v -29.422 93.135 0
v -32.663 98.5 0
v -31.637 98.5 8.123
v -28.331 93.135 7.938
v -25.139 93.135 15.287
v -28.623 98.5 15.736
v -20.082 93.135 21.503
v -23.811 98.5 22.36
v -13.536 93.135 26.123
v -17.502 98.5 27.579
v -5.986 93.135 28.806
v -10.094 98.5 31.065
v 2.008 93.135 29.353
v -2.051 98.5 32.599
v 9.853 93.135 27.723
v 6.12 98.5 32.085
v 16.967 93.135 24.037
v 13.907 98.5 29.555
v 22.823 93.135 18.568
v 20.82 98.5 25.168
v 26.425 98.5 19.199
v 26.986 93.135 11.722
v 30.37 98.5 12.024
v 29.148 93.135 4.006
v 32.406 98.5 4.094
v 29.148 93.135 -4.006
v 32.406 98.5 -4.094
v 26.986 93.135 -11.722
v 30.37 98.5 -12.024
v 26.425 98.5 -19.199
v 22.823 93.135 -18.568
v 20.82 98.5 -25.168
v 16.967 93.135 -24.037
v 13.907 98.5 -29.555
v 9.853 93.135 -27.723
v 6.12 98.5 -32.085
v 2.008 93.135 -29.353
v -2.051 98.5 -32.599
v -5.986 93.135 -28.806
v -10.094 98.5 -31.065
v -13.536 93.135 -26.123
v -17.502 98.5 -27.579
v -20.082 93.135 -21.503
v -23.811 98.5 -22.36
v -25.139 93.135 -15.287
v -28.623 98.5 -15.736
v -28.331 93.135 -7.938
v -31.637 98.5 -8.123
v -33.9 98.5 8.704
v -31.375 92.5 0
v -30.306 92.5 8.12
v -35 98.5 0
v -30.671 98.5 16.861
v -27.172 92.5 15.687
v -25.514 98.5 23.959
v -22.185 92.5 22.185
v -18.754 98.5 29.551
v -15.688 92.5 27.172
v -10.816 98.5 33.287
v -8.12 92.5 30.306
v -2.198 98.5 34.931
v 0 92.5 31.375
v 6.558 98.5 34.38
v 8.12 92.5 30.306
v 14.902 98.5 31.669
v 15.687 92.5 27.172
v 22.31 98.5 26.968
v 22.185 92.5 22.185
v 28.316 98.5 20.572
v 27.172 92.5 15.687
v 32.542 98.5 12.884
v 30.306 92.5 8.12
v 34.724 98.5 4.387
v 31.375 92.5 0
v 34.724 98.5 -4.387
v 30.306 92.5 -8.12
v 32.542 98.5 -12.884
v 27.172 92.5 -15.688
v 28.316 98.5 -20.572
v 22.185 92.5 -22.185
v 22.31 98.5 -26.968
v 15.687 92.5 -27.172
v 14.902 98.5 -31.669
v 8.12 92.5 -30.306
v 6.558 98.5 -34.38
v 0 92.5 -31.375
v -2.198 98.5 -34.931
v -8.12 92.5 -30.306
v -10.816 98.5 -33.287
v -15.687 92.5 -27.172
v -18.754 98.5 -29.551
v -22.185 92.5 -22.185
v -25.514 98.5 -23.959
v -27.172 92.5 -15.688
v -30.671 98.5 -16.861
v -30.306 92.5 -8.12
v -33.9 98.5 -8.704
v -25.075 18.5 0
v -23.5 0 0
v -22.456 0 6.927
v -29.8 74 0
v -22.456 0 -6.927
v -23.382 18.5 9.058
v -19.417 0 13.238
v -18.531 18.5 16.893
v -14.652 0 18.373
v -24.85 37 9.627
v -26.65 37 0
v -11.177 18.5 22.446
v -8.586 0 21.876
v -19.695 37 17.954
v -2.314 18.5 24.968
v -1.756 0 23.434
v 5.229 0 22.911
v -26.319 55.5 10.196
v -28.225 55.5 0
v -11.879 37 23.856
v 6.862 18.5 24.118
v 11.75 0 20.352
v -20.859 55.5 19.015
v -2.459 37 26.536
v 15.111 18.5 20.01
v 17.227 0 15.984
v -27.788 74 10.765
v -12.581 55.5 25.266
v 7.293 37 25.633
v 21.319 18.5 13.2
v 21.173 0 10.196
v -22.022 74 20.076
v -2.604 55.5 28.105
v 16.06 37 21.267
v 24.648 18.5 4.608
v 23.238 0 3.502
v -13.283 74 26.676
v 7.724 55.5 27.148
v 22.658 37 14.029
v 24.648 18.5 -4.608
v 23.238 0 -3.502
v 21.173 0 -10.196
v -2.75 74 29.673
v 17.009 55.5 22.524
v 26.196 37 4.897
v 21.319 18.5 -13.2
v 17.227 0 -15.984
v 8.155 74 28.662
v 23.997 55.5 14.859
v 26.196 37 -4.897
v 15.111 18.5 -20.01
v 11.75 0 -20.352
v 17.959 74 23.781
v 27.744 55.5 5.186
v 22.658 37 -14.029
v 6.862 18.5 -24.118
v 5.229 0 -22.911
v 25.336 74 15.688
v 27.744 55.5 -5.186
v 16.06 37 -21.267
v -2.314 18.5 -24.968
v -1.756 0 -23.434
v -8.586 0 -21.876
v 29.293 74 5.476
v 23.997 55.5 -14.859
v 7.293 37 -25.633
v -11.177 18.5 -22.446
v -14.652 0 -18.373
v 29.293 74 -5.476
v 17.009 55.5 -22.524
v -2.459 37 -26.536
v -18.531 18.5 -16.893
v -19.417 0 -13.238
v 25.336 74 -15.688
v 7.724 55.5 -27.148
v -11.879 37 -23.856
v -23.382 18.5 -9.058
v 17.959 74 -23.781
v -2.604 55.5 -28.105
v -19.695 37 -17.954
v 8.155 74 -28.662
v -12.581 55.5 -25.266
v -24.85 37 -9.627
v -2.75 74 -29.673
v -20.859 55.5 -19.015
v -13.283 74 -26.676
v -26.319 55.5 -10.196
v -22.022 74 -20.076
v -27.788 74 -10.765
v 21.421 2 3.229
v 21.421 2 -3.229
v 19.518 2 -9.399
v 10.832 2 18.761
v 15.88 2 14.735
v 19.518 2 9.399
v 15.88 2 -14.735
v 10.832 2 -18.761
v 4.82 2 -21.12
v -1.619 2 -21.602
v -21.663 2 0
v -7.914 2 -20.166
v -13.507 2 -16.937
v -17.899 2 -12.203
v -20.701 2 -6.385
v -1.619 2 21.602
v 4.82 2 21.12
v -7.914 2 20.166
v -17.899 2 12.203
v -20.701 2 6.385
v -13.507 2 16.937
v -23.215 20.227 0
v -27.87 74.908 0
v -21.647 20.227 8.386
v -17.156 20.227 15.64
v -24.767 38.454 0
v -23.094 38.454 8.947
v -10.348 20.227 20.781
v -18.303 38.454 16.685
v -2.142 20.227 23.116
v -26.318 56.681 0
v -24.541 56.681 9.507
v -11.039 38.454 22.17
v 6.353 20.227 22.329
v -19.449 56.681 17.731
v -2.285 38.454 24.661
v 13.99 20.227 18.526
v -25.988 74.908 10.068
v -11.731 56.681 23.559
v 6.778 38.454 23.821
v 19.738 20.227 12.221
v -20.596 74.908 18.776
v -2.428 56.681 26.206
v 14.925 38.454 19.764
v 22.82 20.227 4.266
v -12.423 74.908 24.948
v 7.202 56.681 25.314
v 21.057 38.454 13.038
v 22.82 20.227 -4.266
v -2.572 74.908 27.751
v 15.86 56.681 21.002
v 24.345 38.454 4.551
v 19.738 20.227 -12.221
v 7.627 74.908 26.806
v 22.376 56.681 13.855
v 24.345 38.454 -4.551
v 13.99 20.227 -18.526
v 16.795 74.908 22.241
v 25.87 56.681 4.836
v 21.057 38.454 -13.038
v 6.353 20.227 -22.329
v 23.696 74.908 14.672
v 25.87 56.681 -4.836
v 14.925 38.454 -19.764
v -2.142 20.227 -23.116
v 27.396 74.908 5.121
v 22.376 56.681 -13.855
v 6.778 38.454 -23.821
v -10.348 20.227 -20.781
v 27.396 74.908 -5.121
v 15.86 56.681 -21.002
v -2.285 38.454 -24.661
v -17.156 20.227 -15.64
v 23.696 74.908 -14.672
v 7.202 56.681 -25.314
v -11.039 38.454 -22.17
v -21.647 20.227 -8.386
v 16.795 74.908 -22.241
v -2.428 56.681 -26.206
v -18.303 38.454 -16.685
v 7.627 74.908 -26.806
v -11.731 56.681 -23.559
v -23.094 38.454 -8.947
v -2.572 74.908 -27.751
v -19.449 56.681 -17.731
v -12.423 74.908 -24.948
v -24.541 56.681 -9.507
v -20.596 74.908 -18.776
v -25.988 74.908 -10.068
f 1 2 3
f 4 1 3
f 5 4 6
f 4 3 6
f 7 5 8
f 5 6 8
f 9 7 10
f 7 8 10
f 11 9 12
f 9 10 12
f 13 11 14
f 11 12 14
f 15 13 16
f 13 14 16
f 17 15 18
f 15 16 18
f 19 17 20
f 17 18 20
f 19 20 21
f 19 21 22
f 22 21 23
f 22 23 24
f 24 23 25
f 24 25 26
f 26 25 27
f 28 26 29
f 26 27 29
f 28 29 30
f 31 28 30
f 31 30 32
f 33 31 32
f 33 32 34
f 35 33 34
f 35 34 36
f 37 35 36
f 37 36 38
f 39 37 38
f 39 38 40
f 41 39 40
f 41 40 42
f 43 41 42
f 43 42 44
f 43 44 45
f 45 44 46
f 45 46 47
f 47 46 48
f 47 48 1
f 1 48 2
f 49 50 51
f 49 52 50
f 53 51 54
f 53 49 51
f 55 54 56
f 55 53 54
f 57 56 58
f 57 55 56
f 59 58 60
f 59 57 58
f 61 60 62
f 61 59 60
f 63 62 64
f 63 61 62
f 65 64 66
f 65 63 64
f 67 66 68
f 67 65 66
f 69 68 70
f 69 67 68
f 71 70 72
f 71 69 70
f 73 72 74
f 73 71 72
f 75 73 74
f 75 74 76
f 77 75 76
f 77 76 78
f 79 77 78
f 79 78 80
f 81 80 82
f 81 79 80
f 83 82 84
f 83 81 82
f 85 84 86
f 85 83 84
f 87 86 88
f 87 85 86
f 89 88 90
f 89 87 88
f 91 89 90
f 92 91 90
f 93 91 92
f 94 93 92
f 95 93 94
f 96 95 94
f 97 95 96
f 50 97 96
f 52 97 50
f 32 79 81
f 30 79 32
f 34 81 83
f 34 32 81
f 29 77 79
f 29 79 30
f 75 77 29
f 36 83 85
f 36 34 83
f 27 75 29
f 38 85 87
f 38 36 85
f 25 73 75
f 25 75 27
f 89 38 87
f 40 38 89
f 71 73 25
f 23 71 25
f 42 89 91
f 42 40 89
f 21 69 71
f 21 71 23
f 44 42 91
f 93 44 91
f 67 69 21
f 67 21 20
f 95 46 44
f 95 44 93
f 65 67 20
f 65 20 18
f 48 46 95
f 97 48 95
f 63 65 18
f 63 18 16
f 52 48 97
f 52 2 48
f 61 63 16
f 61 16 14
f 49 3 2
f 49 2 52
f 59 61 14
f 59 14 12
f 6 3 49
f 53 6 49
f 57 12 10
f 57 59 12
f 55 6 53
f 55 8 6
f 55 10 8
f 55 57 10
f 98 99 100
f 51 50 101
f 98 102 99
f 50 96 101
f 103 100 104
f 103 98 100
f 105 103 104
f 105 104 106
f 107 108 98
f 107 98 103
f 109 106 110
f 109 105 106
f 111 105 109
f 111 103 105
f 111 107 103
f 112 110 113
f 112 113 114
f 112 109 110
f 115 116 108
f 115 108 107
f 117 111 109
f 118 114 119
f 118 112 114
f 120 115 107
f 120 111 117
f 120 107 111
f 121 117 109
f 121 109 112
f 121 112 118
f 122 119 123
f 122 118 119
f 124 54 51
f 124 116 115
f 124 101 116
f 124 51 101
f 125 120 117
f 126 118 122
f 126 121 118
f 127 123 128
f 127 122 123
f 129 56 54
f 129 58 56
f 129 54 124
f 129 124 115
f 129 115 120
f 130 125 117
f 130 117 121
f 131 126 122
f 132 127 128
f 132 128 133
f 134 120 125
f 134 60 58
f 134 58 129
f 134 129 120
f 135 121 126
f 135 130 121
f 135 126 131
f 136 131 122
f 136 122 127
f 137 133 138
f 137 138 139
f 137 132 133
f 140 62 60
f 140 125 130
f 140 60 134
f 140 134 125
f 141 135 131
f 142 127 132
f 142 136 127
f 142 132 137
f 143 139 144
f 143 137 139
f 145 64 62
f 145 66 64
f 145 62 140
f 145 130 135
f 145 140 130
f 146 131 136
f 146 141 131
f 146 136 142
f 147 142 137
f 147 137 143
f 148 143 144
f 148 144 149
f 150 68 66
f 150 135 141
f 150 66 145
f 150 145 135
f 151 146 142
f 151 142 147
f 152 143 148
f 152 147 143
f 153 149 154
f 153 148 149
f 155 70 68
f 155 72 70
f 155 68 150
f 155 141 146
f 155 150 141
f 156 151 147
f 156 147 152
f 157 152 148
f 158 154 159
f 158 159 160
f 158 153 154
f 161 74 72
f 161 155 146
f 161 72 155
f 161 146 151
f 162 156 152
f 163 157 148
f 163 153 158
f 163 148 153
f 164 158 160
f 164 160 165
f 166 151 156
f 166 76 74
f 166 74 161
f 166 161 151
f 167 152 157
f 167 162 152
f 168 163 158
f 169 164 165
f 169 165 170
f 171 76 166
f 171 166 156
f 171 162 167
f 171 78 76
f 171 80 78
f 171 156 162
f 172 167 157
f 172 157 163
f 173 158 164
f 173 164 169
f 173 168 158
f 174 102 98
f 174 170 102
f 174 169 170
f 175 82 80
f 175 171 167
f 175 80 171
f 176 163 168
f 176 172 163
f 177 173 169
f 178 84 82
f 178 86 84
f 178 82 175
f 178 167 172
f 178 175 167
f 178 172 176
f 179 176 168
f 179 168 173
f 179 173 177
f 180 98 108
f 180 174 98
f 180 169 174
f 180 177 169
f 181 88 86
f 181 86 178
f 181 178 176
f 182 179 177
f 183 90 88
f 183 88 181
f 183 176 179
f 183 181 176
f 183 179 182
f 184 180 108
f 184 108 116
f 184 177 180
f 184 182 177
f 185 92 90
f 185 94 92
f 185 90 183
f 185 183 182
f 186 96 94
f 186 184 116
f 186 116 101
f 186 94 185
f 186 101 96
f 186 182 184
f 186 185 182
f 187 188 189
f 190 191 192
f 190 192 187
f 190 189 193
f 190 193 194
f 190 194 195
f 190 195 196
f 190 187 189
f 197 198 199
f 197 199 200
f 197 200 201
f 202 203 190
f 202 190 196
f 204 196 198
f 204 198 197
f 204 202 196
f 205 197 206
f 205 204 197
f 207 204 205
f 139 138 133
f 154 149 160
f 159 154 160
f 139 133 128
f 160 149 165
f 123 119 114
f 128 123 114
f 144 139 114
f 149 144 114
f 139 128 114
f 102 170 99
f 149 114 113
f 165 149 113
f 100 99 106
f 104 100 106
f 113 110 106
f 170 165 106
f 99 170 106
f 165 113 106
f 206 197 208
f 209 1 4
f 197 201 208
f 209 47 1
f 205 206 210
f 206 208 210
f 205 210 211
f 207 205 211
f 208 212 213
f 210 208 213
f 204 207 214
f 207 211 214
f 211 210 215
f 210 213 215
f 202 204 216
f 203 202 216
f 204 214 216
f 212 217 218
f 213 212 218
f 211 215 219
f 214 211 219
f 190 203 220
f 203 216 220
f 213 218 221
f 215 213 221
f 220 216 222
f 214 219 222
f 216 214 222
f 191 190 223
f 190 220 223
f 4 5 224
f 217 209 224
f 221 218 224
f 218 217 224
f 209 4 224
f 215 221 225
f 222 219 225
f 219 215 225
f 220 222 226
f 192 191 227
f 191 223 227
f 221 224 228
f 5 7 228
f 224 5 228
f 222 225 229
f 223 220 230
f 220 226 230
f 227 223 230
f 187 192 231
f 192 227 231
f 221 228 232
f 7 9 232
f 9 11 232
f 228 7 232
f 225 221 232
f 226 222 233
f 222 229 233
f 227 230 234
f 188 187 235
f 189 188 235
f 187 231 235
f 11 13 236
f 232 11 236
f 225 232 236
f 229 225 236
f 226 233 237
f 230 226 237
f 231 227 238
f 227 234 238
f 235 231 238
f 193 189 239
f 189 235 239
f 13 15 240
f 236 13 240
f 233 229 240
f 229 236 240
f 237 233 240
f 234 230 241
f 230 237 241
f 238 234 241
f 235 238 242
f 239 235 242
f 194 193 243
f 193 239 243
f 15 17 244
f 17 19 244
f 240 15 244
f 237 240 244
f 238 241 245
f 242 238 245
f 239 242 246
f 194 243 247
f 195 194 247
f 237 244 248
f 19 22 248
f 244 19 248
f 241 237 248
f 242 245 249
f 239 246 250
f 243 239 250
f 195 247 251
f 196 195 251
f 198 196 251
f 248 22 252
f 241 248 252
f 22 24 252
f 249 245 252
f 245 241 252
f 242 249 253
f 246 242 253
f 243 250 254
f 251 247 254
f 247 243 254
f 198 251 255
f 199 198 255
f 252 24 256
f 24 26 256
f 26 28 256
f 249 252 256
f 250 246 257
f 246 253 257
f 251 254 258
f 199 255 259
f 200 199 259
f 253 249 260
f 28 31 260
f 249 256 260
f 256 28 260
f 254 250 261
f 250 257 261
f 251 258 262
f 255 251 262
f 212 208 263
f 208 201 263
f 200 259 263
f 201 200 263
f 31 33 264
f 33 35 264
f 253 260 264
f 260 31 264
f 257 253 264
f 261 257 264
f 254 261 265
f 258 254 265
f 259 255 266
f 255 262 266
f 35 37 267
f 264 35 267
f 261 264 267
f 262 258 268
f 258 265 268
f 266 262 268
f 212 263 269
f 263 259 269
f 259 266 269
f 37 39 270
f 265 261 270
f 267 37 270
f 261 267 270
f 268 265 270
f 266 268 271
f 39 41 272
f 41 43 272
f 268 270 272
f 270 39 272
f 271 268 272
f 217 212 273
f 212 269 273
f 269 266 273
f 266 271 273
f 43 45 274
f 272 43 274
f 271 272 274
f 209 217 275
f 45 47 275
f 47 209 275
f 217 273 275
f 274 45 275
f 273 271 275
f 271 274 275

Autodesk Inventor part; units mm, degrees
ref_plane "YZ Plane" through (0, 0, 0) normal (1, 0, 0) x (0, 1, 0)
sketch "Sketch1" plane through (0, 0, 0) normal (0, 1, 0) x (-1, 0, 0)
  circle A0 centre (0, 0) radius 23.5
  dimension "d0" = 47
ref_plane "Work Plane1" through (0, 92.5, 0) normal (0, 1, 0) x (-1, 0, 0)
sketch "Sketch2" plane through (0, 92.5, 0) normal (0, 1, 0) x (-1, 0, 0)
  circle A0 centre (0, 0) radius 31.375
  dimension "d2" = 62.75
ref_plane "Work Plane2" through (0, 98.5, 0) normal (0, 1, 0) x (-1, 0, 0)
sketch "Sketch3" plane through (0, 98.5, 0) normal (0, 1, 0) x (-1, 0, 0)
  circle A0 centre (0, 0) radius 35
  dimension "d4" = 70
loft "Loft1" add profiles "Sketch1", "Sketch2"
loft "Loft2" add profiles "Sketch3" section 1 edges at (31.375, 92.5, 0)
shell "Shell1" thickness 2 removed faces 1 at (1.9985, 98.5, 11.019)
properties part number "Cup_Dispenser_Cup"
